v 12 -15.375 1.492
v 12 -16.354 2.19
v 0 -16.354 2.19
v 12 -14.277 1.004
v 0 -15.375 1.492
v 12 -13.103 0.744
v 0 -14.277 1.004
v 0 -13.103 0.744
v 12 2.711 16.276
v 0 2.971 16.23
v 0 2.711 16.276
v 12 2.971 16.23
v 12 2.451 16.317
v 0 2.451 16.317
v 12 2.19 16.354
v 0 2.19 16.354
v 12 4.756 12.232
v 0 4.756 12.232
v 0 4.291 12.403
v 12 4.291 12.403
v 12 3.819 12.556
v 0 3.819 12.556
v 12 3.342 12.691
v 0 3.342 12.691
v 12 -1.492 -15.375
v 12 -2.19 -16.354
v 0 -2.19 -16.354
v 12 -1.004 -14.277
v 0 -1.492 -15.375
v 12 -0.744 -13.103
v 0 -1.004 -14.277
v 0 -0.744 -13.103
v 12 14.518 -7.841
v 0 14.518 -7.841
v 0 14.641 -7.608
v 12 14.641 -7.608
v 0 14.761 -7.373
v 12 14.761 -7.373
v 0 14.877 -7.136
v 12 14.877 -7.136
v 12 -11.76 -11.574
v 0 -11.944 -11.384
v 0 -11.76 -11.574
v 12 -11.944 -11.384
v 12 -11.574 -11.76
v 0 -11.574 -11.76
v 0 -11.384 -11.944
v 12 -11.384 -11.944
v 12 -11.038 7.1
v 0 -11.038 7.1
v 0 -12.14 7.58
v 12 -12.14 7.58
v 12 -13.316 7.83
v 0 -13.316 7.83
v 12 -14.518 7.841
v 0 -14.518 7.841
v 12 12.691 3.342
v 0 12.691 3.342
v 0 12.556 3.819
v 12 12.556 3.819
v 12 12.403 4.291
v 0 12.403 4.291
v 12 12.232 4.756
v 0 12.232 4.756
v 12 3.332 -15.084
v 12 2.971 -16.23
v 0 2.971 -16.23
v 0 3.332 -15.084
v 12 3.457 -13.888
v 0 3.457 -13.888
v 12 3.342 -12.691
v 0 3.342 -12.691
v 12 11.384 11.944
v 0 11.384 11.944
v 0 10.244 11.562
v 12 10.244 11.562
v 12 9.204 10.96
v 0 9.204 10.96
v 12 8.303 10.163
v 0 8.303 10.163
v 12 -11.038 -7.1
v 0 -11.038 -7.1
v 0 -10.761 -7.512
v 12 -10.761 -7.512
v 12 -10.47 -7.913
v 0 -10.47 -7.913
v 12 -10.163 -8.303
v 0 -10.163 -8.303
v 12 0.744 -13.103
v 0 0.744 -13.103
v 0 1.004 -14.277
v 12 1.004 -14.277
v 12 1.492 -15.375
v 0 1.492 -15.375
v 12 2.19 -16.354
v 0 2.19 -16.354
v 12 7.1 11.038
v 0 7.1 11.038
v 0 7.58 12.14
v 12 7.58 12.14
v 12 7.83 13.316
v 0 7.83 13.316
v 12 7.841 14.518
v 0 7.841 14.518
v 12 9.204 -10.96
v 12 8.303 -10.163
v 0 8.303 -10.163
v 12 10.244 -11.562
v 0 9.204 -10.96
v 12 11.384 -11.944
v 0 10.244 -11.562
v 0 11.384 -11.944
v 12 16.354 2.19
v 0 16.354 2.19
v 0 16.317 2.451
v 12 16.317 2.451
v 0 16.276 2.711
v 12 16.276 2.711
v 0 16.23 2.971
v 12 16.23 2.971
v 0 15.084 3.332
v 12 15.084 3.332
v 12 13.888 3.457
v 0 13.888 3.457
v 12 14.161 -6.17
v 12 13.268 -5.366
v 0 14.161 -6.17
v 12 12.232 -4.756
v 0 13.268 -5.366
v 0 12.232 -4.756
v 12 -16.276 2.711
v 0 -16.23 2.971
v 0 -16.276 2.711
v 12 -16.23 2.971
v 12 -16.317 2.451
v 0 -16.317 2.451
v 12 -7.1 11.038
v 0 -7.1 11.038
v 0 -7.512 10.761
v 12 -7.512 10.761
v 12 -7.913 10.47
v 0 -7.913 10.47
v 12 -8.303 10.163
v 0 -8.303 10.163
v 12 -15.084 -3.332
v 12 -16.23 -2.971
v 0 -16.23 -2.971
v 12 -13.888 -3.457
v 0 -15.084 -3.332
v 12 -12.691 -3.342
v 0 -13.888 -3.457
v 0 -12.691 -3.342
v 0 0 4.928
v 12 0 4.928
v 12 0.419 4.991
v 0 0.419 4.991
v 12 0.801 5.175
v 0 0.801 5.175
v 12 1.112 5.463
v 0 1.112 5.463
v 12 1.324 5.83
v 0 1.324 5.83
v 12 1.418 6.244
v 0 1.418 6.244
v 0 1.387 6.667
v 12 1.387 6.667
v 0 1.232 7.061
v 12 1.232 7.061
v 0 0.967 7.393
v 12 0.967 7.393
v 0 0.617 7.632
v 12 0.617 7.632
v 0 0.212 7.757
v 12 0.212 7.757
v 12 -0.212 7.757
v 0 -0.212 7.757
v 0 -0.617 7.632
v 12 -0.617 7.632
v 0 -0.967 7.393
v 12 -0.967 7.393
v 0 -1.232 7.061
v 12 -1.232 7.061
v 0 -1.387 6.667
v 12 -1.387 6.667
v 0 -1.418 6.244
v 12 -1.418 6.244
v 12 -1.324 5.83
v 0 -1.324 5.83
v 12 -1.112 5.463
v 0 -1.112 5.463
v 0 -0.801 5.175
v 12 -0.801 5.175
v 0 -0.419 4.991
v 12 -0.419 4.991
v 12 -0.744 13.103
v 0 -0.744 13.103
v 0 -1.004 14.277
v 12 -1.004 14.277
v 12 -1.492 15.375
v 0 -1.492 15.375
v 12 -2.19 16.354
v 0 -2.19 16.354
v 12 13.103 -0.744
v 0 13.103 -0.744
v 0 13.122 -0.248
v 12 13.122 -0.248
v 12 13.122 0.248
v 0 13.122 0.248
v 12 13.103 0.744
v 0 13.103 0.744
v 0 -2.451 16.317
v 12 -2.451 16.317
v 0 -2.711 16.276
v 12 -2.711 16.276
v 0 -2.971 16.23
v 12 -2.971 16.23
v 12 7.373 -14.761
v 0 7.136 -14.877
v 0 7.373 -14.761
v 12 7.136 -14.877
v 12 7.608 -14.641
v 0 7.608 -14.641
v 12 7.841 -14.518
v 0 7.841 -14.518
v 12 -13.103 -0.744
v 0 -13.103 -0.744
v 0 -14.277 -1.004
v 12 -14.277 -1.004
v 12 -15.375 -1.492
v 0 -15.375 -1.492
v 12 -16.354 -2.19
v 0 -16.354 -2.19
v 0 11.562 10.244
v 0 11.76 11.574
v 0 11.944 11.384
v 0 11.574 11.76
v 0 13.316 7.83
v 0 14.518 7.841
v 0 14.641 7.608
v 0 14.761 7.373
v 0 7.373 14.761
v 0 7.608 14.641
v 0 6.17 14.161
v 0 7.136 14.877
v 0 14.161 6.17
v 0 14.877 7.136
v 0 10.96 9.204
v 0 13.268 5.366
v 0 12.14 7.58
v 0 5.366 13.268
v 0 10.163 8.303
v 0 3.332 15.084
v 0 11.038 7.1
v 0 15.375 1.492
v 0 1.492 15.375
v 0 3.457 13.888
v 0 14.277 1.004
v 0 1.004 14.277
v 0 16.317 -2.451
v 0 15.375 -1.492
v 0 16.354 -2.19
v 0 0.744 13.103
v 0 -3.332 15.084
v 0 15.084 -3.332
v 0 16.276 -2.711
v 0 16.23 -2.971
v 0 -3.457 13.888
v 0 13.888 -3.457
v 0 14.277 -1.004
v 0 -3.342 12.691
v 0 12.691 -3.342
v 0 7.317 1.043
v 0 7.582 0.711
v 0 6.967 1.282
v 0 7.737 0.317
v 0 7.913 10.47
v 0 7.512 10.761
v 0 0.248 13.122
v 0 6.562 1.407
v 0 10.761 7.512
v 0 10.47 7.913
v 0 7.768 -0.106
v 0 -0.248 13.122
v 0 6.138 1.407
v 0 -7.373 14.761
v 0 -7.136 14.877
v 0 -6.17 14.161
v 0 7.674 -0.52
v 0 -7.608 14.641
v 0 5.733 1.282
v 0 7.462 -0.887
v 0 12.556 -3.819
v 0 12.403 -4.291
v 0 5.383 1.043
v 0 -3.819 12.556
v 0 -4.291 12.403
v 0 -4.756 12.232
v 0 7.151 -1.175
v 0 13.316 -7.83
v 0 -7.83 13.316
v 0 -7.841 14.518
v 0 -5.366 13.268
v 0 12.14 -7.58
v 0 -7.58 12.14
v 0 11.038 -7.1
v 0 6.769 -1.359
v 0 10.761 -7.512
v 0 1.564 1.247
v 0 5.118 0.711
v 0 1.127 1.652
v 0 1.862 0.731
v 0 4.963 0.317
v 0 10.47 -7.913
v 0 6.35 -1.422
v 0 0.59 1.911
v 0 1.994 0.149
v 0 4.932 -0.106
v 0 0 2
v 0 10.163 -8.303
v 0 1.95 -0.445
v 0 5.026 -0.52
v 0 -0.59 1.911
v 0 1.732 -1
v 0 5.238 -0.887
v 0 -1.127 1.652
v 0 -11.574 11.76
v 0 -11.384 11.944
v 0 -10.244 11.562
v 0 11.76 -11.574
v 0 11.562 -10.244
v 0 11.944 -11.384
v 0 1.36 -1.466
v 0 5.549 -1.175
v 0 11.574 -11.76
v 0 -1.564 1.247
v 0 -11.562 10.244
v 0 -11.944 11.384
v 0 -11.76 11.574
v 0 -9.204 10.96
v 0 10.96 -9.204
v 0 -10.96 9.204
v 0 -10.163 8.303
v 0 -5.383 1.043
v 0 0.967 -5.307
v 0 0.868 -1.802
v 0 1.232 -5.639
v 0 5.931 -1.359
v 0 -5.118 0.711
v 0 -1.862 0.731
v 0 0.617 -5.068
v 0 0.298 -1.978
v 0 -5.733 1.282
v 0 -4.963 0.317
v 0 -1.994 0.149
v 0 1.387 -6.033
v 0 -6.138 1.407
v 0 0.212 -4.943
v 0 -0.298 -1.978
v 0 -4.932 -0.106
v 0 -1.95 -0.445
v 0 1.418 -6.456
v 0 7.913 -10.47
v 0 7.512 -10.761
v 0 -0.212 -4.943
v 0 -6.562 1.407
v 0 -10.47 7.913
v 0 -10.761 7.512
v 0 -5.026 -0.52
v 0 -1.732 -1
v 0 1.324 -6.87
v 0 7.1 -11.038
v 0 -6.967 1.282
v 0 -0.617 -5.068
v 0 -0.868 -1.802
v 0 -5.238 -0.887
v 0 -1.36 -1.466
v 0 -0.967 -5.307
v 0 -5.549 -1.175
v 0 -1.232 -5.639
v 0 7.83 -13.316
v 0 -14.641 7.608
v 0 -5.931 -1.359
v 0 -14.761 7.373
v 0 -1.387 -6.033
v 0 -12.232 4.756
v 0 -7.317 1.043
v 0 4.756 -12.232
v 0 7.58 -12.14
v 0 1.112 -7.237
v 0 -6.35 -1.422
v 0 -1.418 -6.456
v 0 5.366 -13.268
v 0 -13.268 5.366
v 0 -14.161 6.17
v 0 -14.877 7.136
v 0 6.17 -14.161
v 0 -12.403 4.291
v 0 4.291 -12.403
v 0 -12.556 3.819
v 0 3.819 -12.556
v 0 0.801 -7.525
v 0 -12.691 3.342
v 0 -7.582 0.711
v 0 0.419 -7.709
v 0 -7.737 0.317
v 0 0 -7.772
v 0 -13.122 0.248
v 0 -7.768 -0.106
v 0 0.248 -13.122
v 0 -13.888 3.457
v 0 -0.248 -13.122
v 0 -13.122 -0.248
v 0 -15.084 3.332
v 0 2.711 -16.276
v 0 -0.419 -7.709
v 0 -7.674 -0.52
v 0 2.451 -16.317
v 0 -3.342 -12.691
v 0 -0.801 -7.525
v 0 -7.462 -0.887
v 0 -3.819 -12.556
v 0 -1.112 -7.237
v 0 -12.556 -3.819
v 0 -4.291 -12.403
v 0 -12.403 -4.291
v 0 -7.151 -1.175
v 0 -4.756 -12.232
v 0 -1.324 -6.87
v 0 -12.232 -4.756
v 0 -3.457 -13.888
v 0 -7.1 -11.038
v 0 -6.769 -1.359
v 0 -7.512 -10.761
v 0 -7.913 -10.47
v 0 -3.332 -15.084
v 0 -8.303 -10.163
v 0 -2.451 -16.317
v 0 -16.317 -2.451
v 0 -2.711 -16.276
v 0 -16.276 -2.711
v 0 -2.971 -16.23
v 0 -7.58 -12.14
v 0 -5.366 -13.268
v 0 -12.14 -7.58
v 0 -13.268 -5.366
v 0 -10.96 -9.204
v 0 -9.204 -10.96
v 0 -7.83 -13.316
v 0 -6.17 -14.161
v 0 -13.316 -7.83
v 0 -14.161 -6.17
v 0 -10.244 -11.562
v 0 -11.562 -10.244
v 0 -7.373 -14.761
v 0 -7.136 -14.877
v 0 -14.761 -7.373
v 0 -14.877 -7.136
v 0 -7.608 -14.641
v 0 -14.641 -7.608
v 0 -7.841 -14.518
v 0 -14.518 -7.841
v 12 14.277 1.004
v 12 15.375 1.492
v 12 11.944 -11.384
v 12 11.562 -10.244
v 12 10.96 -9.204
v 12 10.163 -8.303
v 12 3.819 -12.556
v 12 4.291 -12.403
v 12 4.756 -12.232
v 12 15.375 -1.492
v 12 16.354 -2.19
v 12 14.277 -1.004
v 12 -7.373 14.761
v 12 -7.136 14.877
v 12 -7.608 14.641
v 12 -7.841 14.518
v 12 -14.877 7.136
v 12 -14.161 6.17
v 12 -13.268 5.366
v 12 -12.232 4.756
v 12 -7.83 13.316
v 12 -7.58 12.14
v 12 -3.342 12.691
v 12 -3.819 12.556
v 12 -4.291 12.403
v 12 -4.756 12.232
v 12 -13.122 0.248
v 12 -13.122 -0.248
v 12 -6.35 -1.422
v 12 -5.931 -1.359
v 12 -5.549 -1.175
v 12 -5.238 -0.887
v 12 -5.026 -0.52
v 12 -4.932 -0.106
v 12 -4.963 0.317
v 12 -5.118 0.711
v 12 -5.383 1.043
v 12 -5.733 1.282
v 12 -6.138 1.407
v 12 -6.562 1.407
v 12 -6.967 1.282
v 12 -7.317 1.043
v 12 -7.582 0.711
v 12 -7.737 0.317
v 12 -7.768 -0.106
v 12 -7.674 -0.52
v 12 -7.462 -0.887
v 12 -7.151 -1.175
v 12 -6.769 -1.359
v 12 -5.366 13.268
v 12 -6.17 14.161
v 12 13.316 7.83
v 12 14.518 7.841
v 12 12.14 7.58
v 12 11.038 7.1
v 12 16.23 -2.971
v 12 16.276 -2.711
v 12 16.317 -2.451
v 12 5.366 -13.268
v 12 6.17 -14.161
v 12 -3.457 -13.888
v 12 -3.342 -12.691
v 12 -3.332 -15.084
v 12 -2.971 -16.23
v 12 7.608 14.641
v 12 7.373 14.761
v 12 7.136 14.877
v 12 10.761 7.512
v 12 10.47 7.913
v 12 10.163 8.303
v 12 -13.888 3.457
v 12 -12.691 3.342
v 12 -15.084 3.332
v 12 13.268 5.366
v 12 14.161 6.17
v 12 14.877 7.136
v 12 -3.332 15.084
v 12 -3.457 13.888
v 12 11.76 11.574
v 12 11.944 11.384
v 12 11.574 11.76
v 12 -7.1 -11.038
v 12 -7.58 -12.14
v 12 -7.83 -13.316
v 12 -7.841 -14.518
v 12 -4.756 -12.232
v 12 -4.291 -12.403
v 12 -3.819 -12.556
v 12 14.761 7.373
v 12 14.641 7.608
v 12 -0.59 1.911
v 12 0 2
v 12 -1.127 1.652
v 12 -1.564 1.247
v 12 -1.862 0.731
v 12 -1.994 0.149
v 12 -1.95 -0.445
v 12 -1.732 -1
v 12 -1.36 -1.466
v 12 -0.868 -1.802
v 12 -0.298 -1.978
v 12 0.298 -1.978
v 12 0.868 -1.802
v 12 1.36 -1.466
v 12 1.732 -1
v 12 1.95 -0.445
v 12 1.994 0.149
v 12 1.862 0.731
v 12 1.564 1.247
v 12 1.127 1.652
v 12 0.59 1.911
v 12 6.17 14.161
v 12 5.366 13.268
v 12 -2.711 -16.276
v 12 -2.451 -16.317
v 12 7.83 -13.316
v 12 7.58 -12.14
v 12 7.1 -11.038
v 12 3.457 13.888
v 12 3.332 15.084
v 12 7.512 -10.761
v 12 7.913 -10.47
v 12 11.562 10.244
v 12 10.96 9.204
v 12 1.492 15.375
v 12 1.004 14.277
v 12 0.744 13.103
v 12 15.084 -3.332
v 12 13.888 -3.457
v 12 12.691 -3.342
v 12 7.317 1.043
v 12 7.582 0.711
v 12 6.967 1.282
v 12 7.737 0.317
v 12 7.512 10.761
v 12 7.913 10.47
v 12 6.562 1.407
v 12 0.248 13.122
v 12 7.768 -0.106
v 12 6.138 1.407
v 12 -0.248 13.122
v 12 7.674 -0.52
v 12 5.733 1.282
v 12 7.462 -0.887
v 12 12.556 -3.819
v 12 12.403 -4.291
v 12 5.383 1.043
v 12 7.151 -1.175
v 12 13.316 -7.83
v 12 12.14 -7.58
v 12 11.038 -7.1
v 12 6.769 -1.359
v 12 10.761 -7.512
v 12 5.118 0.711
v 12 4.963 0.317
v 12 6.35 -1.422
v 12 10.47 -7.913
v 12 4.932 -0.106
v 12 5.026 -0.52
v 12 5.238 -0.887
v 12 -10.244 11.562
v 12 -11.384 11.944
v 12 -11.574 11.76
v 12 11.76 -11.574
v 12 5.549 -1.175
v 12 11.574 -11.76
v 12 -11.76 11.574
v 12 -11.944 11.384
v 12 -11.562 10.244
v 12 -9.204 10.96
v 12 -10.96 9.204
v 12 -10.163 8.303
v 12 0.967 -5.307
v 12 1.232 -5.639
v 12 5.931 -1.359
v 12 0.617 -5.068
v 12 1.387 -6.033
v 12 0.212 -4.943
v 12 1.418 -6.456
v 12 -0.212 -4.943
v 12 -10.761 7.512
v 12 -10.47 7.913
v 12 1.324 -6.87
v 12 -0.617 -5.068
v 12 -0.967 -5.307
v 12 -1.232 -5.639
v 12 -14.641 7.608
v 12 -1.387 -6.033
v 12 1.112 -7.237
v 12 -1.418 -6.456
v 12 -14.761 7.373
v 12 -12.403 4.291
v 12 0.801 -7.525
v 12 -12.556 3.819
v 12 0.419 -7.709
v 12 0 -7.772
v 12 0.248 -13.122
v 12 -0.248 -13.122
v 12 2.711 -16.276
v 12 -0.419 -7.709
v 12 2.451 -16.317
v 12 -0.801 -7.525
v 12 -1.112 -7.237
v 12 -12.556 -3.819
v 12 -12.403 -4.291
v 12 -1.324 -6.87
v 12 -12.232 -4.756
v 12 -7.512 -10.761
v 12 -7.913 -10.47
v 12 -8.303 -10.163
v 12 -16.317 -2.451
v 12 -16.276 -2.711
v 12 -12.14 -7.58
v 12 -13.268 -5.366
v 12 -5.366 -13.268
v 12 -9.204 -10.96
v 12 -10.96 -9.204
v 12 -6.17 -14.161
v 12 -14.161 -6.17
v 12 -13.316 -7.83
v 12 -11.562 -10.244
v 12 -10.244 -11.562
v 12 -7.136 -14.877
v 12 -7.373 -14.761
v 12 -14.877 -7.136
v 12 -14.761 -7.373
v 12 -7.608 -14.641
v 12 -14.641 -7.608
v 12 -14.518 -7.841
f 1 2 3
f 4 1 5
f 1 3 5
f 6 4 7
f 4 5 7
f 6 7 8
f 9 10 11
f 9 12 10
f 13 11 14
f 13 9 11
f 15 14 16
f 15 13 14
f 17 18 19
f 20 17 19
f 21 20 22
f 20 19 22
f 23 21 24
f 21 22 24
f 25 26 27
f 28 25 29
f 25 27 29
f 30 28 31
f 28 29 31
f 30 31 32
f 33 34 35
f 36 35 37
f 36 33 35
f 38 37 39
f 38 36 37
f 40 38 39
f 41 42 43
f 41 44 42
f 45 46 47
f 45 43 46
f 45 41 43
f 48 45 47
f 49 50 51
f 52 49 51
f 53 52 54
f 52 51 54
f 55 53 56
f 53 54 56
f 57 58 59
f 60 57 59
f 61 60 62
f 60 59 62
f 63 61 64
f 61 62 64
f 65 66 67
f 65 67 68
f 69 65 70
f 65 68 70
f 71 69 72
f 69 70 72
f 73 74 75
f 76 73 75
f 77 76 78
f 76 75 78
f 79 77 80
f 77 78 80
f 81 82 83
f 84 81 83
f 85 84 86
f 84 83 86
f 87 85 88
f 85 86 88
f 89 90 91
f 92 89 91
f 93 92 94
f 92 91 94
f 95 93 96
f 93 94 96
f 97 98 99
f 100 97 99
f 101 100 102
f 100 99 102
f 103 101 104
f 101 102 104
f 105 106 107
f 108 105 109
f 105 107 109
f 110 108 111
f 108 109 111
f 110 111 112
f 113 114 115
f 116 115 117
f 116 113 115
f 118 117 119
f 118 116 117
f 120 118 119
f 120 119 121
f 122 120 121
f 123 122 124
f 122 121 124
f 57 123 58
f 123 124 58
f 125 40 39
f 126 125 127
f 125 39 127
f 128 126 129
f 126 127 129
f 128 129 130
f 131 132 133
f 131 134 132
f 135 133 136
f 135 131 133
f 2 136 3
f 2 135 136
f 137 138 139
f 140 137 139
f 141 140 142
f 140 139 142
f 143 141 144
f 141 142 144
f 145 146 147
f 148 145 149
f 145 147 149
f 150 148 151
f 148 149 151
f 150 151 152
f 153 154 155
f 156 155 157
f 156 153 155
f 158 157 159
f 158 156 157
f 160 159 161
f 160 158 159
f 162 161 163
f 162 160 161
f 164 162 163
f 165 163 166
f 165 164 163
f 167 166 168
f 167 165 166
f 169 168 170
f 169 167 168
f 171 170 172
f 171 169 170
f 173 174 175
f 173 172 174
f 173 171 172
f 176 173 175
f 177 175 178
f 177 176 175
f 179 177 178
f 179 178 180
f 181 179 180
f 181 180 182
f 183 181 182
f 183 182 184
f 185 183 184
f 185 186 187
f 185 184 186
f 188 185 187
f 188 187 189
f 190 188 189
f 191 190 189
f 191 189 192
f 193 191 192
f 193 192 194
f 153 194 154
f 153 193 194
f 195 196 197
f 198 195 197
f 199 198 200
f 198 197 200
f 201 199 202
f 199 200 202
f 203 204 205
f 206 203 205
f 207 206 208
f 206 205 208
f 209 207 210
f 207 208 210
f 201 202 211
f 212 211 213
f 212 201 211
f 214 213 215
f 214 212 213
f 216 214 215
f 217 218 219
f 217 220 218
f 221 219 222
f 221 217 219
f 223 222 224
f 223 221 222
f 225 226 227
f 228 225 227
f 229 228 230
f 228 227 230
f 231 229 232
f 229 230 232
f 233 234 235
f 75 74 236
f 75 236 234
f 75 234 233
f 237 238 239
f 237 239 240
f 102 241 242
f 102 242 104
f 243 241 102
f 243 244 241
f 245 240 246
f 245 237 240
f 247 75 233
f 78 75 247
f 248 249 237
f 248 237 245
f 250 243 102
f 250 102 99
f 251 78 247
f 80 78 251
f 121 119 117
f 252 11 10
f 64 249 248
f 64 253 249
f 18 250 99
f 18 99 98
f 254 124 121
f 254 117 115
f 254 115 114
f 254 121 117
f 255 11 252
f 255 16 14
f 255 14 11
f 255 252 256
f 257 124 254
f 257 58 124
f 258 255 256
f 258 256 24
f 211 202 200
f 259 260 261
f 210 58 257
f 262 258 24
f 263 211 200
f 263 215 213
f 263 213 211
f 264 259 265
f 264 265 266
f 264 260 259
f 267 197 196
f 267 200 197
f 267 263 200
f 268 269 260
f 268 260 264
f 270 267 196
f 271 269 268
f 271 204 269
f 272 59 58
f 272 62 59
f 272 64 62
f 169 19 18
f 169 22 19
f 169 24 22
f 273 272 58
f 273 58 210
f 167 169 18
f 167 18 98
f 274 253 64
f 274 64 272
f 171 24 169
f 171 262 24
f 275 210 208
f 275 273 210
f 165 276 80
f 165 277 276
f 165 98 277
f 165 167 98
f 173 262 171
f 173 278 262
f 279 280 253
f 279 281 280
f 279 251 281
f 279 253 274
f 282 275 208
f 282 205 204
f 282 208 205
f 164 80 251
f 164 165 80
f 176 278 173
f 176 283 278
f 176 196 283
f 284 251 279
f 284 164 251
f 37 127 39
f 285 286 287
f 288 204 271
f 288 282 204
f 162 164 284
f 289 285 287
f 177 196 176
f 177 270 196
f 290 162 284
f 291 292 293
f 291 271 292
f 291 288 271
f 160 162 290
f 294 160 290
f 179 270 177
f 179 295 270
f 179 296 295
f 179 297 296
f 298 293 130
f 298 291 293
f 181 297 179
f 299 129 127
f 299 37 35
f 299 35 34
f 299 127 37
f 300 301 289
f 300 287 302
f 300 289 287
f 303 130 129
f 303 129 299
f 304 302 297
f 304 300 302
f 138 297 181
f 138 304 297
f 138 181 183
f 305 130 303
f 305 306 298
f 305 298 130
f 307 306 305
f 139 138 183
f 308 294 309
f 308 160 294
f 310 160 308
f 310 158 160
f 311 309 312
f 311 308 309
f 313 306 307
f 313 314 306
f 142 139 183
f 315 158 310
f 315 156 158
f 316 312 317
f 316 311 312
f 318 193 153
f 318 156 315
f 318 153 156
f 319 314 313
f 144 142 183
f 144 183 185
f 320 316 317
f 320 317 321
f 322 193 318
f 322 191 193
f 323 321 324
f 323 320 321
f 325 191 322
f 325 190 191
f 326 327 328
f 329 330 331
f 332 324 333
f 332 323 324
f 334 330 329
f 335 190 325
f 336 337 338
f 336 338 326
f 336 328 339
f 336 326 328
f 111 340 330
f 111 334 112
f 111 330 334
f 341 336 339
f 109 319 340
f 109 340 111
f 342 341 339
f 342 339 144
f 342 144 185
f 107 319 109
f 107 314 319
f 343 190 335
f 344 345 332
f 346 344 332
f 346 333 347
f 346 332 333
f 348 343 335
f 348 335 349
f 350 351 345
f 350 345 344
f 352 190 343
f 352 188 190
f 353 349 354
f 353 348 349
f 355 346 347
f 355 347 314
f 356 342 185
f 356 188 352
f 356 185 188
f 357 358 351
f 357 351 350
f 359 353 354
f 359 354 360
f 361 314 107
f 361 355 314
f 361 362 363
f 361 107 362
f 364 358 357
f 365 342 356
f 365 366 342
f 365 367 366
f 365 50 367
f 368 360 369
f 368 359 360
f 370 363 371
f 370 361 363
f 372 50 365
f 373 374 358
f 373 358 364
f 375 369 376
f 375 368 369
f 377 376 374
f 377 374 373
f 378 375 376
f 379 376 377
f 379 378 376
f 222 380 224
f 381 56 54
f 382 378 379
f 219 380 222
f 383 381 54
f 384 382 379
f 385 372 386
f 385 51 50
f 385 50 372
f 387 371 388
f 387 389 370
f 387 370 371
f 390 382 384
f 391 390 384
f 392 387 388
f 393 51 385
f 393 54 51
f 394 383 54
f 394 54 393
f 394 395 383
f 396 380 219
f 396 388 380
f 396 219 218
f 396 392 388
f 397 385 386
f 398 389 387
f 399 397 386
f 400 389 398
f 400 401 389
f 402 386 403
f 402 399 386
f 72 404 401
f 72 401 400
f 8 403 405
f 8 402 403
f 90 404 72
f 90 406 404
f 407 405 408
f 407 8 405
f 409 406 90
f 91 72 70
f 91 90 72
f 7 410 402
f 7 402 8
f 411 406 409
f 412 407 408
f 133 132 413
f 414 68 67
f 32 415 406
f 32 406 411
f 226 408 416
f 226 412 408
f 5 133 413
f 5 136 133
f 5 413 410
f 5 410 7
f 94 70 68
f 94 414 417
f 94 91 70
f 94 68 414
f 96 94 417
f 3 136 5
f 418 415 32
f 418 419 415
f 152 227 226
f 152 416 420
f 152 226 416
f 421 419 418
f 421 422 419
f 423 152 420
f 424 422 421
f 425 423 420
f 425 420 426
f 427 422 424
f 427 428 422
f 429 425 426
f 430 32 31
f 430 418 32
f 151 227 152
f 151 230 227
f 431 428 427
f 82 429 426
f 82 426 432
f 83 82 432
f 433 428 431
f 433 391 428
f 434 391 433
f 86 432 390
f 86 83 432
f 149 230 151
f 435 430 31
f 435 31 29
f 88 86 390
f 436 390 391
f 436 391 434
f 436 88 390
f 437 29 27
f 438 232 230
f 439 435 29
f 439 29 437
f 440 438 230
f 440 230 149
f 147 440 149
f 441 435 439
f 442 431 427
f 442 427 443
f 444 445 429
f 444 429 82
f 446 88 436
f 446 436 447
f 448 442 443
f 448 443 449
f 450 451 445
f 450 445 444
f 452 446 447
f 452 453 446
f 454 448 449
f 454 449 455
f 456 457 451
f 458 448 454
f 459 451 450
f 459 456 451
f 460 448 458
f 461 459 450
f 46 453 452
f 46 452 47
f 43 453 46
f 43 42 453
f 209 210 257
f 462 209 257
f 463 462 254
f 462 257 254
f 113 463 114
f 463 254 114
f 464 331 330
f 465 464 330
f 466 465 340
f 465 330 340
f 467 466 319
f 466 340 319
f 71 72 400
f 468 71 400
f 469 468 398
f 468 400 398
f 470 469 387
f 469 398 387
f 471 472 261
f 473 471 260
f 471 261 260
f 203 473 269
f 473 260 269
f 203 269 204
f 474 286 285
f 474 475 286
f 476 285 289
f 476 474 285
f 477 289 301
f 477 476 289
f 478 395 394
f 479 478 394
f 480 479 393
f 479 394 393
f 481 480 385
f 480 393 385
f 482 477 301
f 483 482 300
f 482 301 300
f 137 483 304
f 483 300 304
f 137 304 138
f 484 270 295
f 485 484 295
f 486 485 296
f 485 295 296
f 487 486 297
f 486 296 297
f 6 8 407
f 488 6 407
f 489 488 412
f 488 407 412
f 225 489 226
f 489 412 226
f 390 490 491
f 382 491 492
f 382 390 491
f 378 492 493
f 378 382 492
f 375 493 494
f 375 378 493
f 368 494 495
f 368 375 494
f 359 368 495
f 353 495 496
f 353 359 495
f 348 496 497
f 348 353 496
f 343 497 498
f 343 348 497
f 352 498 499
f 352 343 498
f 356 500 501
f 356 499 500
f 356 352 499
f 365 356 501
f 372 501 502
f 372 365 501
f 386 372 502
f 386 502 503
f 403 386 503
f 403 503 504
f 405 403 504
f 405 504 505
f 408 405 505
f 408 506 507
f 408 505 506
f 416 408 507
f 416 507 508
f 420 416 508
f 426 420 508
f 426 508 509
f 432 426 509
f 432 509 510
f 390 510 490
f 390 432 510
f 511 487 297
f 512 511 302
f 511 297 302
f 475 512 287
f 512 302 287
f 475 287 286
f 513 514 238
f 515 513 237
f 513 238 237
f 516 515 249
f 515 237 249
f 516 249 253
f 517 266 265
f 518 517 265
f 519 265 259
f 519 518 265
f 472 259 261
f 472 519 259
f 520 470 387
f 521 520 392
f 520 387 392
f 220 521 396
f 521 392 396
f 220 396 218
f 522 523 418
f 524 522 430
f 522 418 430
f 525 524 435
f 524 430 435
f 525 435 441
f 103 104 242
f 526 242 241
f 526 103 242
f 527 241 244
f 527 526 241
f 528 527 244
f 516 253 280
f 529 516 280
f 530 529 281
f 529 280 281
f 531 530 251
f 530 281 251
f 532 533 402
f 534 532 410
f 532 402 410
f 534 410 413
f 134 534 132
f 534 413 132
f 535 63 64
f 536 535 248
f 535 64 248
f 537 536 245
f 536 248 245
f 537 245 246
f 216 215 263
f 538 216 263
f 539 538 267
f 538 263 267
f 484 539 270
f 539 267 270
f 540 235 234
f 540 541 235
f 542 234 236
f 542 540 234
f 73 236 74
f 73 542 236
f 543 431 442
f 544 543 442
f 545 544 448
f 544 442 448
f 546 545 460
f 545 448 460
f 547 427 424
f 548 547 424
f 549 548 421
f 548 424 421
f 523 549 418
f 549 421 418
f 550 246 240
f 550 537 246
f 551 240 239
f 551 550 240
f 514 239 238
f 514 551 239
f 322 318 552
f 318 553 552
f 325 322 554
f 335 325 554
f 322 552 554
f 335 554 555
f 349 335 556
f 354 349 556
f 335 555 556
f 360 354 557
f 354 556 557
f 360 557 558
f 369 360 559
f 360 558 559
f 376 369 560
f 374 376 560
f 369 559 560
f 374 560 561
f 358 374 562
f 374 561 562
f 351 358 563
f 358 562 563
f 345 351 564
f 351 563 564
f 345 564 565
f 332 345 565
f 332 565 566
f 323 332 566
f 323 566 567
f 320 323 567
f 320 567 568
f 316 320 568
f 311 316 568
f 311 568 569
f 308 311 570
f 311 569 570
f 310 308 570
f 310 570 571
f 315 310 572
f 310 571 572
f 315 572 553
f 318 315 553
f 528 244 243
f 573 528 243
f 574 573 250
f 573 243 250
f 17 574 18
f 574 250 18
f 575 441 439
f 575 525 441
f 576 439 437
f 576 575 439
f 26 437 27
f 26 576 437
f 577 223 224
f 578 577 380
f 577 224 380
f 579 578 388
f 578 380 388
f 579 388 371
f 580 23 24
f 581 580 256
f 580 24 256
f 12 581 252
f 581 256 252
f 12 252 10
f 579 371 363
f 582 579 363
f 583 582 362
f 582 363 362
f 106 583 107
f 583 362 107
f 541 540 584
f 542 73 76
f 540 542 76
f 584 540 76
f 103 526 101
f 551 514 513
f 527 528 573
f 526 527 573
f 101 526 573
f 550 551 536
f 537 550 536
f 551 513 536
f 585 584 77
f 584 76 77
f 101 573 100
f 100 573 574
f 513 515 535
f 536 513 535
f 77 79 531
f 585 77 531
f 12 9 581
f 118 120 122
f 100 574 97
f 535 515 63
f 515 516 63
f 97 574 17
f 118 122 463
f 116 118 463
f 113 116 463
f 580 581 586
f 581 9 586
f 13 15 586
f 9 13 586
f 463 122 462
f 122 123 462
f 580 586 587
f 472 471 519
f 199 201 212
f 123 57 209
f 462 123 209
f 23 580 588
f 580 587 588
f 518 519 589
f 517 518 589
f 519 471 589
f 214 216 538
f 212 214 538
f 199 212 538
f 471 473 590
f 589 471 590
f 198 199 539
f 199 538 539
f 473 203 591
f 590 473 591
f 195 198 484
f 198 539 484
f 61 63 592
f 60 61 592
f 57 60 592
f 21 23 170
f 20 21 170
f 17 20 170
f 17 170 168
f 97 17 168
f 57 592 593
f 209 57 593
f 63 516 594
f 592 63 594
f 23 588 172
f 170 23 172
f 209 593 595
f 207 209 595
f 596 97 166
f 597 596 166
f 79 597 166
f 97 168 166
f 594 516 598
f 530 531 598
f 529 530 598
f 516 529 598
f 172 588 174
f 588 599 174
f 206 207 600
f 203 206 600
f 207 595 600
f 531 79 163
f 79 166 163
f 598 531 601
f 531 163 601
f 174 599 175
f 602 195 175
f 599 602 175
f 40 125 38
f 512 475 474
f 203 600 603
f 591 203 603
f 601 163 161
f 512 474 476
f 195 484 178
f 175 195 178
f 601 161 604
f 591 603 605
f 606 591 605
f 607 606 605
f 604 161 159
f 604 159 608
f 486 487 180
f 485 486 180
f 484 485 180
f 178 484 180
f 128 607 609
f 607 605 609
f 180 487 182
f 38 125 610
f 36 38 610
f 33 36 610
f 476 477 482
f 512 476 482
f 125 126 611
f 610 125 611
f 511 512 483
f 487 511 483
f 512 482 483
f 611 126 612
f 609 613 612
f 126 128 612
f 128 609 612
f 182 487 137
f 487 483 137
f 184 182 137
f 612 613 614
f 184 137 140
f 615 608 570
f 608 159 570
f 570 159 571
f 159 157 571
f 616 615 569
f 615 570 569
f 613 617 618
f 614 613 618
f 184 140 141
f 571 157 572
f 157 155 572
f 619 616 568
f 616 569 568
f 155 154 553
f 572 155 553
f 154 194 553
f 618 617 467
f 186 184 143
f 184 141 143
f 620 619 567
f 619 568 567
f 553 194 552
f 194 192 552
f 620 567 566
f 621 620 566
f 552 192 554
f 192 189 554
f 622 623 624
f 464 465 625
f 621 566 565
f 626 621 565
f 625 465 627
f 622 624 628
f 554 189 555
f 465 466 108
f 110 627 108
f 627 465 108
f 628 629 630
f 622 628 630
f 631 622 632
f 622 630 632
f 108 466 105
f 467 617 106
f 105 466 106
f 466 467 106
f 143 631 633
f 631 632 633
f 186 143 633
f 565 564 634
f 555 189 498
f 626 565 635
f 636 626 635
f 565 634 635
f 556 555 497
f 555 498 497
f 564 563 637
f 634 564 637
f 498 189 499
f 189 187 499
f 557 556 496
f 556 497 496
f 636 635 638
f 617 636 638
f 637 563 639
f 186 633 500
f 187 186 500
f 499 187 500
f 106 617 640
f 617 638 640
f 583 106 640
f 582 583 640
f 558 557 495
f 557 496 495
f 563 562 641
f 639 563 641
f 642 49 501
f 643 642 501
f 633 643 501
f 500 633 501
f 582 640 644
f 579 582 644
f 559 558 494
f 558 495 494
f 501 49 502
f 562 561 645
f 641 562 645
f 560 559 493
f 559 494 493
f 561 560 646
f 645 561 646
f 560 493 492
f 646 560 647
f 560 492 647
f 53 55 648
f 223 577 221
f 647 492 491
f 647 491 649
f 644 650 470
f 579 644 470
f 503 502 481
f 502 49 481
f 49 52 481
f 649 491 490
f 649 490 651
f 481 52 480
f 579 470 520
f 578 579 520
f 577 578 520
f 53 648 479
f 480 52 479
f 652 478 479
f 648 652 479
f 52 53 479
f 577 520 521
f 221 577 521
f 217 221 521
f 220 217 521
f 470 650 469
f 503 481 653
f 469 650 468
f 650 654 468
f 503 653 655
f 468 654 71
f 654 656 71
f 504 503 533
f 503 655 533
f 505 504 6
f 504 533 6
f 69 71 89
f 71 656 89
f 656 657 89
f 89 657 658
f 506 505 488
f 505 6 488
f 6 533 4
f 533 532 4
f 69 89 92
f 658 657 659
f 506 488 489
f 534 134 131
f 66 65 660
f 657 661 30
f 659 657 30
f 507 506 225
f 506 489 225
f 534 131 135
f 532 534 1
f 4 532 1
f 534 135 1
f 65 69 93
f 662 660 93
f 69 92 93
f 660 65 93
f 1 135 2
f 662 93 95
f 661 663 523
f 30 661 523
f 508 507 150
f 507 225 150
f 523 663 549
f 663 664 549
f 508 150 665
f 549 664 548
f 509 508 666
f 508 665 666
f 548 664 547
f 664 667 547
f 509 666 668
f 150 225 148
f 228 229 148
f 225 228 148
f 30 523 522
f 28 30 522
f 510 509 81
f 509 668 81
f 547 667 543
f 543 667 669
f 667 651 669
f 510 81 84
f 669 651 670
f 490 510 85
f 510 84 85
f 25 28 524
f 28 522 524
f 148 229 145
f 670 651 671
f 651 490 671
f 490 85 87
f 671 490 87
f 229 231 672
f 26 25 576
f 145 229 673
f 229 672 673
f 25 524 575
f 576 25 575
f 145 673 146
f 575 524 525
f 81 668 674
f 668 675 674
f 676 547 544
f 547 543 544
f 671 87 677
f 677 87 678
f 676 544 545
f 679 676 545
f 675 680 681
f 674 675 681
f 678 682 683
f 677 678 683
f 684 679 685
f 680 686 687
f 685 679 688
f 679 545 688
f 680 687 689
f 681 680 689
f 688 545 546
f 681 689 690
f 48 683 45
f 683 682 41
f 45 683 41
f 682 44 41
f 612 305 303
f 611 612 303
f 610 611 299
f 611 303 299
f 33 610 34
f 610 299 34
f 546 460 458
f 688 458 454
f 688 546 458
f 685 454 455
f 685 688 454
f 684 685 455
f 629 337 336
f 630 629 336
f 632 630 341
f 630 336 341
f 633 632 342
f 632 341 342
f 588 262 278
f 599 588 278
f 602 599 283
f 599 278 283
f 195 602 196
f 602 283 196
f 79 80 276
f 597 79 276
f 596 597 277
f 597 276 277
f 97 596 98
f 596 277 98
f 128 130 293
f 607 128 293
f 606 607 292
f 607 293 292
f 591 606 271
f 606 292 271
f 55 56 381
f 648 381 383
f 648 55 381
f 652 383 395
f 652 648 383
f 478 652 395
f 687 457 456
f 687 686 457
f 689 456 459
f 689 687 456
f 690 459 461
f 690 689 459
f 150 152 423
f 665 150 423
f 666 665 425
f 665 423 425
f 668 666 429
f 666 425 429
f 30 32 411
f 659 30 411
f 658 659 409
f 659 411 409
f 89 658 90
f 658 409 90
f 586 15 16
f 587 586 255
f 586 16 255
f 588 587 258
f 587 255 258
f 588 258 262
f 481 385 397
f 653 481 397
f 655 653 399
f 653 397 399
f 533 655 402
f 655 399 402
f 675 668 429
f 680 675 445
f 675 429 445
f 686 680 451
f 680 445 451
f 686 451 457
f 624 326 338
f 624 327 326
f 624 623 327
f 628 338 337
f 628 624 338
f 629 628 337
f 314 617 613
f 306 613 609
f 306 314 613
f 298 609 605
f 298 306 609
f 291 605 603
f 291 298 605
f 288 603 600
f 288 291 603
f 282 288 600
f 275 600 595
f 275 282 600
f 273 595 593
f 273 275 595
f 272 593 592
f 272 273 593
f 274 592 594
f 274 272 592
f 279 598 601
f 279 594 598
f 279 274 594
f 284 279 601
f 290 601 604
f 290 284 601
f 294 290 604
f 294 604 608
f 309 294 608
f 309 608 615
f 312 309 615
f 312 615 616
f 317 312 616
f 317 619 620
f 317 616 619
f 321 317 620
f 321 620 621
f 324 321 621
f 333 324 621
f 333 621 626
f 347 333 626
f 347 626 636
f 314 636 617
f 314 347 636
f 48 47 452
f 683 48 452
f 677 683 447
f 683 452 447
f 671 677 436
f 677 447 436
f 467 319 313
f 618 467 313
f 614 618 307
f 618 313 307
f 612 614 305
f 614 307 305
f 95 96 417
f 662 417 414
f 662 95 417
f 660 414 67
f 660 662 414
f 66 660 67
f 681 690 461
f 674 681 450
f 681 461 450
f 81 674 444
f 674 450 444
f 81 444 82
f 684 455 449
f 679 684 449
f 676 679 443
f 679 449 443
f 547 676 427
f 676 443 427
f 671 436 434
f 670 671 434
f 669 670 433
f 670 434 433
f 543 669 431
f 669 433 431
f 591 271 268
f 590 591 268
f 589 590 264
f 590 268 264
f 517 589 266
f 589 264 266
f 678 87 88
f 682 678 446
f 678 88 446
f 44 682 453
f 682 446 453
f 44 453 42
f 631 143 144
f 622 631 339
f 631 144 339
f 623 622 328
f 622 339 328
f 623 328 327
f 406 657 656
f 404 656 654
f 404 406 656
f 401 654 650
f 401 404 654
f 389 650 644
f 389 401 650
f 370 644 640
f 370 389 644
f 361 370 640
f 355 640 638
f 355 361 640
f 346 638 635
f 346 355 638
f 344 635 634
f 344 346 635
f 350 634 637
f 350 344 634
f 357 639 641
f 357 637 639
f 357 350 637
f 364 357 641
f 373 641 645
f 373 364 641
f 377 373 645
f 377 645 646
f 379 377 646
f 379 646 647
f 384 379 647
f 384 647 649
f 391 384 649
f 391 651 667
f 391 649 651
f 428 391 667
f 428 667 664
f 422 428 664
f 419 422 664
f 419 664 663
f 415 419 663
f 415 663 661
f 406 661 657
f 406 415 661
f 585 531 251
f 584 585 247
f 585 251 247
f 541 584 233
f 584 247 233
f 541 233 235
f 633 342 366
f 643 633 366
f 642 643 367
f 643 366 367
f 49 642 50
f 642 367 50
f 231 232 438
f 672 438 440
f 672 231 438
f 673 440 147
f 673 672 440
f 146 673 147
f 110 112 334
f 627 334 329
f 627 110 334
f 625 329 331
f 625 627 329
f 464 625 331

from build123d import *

# Parameters (mm, degrees)
BASPROSKE_W        = 12
BASPROSKE_H        = 16.5
TOOTHCUT_DEPTH     = 27.239283527
TEETHCUTS_COUNT    = 20
TEETHCUTS_ANGLE    = 342
BORSKE_R           = 2
BORE_DEPTH         = 50.0000508
SKETCH1_R          = 1.4224
CUT_EXTRUDE1_DEPTH = 27.055895681


with BuildPart() as part:
    # BasProSke → Base-Revolve (revolve)
    with BuildSketch(Plane(origin=(0, 0, 0), x_dir=(1, 0, 0), z_dir=(0, 1, 0)), mode=Mode.PRIVATE) as base_revolve_sk:
        with Locations((6, 8.25)):
            Rectangle(BASPROSKE_W, BASPROSKE_H)
    revolve(base_revolve_sk.sketch.rotate(Axis((-10, 0, 0), (1, 0, 0)), 180), axis=Axis((-10, 0, 0), (1, 0, 0)))

    # TooCutSke → ToothCut (cut, through all)
    with BuildSketch(Plane(origin=(0, 0, 0), x_dir=(0, 0, -1), z_dir=(1, 0, 0))):
        with BuildLine():
            ThreePointArc((0.74381438, 13.102904875), (0, 13.124), (-0.74381438, 13.102904875))
            ThreePointArc((-0.74381438, 13.102904875), (-1.226473103, 14.852072512), (-2.209965745, 16.376962373))
            ThreePointArc((-2.209965745, 16.376962373), (0, 16.5254), (2.209965745, 16.376962373))
            ThreePointArc((2.209965745, 16.376962373), (1.226473103, 14.852072512), (0.74381438, 13.102904875))
        make_face()
    toothcut = extrude(amount=TOOTHCUT_DEPTH, mode=Mode.SUBTRACT)

    # TeethCuts: ToothCut ×20 about axis
    teethcuts_axis = Axis((-10, 0, 0), (1, 0, 0))
    for i in range(1, TEETHCUTS_COUNT):
        add(toothcut.rotate(teethcuts_axis, i * TEETHCUTS_ANGLE / (TEETHCUTS_COUNT - 1)), mode=Mode.SUBTRACT)

    # BorSke → Bore (cut, symmetric)
    with BuildSketch(Plane(origin=(0, 0, 0), x_dir=(0, 0, -1), z_dir=(1, 0, 0))):
        with Locations(Location((0, 0, 0), (0, 0, 180))):
            Circle(BORSKE_R)
    extrude(amount=BORE_DEPTH, both=True, mode=Mode.SUBTRACT)

    # Sketch1 → Cut-Extrude1 (cut, through all)
    with BuildSketch(Plane(origin=(0, 0, 0), x_dir=(0, 0, -1), z_dir=(1, 0, 0))):
        with Locations((0, 6.35)):
            Circle(SKETCH1_R)
        with Locations((6.35, 0)):
            Circle(SKETCH1_R)
        with Locations((0, -6.35)):
            Circle(SKETCH1_R)
        with Locations((-6.35, 0)):
            Circle(SKETCH1_R)
    extrude(amount=CUT_EXTRUDE1_DEPTH, mode=Mode.SUBTRACT)


solid = part.part
